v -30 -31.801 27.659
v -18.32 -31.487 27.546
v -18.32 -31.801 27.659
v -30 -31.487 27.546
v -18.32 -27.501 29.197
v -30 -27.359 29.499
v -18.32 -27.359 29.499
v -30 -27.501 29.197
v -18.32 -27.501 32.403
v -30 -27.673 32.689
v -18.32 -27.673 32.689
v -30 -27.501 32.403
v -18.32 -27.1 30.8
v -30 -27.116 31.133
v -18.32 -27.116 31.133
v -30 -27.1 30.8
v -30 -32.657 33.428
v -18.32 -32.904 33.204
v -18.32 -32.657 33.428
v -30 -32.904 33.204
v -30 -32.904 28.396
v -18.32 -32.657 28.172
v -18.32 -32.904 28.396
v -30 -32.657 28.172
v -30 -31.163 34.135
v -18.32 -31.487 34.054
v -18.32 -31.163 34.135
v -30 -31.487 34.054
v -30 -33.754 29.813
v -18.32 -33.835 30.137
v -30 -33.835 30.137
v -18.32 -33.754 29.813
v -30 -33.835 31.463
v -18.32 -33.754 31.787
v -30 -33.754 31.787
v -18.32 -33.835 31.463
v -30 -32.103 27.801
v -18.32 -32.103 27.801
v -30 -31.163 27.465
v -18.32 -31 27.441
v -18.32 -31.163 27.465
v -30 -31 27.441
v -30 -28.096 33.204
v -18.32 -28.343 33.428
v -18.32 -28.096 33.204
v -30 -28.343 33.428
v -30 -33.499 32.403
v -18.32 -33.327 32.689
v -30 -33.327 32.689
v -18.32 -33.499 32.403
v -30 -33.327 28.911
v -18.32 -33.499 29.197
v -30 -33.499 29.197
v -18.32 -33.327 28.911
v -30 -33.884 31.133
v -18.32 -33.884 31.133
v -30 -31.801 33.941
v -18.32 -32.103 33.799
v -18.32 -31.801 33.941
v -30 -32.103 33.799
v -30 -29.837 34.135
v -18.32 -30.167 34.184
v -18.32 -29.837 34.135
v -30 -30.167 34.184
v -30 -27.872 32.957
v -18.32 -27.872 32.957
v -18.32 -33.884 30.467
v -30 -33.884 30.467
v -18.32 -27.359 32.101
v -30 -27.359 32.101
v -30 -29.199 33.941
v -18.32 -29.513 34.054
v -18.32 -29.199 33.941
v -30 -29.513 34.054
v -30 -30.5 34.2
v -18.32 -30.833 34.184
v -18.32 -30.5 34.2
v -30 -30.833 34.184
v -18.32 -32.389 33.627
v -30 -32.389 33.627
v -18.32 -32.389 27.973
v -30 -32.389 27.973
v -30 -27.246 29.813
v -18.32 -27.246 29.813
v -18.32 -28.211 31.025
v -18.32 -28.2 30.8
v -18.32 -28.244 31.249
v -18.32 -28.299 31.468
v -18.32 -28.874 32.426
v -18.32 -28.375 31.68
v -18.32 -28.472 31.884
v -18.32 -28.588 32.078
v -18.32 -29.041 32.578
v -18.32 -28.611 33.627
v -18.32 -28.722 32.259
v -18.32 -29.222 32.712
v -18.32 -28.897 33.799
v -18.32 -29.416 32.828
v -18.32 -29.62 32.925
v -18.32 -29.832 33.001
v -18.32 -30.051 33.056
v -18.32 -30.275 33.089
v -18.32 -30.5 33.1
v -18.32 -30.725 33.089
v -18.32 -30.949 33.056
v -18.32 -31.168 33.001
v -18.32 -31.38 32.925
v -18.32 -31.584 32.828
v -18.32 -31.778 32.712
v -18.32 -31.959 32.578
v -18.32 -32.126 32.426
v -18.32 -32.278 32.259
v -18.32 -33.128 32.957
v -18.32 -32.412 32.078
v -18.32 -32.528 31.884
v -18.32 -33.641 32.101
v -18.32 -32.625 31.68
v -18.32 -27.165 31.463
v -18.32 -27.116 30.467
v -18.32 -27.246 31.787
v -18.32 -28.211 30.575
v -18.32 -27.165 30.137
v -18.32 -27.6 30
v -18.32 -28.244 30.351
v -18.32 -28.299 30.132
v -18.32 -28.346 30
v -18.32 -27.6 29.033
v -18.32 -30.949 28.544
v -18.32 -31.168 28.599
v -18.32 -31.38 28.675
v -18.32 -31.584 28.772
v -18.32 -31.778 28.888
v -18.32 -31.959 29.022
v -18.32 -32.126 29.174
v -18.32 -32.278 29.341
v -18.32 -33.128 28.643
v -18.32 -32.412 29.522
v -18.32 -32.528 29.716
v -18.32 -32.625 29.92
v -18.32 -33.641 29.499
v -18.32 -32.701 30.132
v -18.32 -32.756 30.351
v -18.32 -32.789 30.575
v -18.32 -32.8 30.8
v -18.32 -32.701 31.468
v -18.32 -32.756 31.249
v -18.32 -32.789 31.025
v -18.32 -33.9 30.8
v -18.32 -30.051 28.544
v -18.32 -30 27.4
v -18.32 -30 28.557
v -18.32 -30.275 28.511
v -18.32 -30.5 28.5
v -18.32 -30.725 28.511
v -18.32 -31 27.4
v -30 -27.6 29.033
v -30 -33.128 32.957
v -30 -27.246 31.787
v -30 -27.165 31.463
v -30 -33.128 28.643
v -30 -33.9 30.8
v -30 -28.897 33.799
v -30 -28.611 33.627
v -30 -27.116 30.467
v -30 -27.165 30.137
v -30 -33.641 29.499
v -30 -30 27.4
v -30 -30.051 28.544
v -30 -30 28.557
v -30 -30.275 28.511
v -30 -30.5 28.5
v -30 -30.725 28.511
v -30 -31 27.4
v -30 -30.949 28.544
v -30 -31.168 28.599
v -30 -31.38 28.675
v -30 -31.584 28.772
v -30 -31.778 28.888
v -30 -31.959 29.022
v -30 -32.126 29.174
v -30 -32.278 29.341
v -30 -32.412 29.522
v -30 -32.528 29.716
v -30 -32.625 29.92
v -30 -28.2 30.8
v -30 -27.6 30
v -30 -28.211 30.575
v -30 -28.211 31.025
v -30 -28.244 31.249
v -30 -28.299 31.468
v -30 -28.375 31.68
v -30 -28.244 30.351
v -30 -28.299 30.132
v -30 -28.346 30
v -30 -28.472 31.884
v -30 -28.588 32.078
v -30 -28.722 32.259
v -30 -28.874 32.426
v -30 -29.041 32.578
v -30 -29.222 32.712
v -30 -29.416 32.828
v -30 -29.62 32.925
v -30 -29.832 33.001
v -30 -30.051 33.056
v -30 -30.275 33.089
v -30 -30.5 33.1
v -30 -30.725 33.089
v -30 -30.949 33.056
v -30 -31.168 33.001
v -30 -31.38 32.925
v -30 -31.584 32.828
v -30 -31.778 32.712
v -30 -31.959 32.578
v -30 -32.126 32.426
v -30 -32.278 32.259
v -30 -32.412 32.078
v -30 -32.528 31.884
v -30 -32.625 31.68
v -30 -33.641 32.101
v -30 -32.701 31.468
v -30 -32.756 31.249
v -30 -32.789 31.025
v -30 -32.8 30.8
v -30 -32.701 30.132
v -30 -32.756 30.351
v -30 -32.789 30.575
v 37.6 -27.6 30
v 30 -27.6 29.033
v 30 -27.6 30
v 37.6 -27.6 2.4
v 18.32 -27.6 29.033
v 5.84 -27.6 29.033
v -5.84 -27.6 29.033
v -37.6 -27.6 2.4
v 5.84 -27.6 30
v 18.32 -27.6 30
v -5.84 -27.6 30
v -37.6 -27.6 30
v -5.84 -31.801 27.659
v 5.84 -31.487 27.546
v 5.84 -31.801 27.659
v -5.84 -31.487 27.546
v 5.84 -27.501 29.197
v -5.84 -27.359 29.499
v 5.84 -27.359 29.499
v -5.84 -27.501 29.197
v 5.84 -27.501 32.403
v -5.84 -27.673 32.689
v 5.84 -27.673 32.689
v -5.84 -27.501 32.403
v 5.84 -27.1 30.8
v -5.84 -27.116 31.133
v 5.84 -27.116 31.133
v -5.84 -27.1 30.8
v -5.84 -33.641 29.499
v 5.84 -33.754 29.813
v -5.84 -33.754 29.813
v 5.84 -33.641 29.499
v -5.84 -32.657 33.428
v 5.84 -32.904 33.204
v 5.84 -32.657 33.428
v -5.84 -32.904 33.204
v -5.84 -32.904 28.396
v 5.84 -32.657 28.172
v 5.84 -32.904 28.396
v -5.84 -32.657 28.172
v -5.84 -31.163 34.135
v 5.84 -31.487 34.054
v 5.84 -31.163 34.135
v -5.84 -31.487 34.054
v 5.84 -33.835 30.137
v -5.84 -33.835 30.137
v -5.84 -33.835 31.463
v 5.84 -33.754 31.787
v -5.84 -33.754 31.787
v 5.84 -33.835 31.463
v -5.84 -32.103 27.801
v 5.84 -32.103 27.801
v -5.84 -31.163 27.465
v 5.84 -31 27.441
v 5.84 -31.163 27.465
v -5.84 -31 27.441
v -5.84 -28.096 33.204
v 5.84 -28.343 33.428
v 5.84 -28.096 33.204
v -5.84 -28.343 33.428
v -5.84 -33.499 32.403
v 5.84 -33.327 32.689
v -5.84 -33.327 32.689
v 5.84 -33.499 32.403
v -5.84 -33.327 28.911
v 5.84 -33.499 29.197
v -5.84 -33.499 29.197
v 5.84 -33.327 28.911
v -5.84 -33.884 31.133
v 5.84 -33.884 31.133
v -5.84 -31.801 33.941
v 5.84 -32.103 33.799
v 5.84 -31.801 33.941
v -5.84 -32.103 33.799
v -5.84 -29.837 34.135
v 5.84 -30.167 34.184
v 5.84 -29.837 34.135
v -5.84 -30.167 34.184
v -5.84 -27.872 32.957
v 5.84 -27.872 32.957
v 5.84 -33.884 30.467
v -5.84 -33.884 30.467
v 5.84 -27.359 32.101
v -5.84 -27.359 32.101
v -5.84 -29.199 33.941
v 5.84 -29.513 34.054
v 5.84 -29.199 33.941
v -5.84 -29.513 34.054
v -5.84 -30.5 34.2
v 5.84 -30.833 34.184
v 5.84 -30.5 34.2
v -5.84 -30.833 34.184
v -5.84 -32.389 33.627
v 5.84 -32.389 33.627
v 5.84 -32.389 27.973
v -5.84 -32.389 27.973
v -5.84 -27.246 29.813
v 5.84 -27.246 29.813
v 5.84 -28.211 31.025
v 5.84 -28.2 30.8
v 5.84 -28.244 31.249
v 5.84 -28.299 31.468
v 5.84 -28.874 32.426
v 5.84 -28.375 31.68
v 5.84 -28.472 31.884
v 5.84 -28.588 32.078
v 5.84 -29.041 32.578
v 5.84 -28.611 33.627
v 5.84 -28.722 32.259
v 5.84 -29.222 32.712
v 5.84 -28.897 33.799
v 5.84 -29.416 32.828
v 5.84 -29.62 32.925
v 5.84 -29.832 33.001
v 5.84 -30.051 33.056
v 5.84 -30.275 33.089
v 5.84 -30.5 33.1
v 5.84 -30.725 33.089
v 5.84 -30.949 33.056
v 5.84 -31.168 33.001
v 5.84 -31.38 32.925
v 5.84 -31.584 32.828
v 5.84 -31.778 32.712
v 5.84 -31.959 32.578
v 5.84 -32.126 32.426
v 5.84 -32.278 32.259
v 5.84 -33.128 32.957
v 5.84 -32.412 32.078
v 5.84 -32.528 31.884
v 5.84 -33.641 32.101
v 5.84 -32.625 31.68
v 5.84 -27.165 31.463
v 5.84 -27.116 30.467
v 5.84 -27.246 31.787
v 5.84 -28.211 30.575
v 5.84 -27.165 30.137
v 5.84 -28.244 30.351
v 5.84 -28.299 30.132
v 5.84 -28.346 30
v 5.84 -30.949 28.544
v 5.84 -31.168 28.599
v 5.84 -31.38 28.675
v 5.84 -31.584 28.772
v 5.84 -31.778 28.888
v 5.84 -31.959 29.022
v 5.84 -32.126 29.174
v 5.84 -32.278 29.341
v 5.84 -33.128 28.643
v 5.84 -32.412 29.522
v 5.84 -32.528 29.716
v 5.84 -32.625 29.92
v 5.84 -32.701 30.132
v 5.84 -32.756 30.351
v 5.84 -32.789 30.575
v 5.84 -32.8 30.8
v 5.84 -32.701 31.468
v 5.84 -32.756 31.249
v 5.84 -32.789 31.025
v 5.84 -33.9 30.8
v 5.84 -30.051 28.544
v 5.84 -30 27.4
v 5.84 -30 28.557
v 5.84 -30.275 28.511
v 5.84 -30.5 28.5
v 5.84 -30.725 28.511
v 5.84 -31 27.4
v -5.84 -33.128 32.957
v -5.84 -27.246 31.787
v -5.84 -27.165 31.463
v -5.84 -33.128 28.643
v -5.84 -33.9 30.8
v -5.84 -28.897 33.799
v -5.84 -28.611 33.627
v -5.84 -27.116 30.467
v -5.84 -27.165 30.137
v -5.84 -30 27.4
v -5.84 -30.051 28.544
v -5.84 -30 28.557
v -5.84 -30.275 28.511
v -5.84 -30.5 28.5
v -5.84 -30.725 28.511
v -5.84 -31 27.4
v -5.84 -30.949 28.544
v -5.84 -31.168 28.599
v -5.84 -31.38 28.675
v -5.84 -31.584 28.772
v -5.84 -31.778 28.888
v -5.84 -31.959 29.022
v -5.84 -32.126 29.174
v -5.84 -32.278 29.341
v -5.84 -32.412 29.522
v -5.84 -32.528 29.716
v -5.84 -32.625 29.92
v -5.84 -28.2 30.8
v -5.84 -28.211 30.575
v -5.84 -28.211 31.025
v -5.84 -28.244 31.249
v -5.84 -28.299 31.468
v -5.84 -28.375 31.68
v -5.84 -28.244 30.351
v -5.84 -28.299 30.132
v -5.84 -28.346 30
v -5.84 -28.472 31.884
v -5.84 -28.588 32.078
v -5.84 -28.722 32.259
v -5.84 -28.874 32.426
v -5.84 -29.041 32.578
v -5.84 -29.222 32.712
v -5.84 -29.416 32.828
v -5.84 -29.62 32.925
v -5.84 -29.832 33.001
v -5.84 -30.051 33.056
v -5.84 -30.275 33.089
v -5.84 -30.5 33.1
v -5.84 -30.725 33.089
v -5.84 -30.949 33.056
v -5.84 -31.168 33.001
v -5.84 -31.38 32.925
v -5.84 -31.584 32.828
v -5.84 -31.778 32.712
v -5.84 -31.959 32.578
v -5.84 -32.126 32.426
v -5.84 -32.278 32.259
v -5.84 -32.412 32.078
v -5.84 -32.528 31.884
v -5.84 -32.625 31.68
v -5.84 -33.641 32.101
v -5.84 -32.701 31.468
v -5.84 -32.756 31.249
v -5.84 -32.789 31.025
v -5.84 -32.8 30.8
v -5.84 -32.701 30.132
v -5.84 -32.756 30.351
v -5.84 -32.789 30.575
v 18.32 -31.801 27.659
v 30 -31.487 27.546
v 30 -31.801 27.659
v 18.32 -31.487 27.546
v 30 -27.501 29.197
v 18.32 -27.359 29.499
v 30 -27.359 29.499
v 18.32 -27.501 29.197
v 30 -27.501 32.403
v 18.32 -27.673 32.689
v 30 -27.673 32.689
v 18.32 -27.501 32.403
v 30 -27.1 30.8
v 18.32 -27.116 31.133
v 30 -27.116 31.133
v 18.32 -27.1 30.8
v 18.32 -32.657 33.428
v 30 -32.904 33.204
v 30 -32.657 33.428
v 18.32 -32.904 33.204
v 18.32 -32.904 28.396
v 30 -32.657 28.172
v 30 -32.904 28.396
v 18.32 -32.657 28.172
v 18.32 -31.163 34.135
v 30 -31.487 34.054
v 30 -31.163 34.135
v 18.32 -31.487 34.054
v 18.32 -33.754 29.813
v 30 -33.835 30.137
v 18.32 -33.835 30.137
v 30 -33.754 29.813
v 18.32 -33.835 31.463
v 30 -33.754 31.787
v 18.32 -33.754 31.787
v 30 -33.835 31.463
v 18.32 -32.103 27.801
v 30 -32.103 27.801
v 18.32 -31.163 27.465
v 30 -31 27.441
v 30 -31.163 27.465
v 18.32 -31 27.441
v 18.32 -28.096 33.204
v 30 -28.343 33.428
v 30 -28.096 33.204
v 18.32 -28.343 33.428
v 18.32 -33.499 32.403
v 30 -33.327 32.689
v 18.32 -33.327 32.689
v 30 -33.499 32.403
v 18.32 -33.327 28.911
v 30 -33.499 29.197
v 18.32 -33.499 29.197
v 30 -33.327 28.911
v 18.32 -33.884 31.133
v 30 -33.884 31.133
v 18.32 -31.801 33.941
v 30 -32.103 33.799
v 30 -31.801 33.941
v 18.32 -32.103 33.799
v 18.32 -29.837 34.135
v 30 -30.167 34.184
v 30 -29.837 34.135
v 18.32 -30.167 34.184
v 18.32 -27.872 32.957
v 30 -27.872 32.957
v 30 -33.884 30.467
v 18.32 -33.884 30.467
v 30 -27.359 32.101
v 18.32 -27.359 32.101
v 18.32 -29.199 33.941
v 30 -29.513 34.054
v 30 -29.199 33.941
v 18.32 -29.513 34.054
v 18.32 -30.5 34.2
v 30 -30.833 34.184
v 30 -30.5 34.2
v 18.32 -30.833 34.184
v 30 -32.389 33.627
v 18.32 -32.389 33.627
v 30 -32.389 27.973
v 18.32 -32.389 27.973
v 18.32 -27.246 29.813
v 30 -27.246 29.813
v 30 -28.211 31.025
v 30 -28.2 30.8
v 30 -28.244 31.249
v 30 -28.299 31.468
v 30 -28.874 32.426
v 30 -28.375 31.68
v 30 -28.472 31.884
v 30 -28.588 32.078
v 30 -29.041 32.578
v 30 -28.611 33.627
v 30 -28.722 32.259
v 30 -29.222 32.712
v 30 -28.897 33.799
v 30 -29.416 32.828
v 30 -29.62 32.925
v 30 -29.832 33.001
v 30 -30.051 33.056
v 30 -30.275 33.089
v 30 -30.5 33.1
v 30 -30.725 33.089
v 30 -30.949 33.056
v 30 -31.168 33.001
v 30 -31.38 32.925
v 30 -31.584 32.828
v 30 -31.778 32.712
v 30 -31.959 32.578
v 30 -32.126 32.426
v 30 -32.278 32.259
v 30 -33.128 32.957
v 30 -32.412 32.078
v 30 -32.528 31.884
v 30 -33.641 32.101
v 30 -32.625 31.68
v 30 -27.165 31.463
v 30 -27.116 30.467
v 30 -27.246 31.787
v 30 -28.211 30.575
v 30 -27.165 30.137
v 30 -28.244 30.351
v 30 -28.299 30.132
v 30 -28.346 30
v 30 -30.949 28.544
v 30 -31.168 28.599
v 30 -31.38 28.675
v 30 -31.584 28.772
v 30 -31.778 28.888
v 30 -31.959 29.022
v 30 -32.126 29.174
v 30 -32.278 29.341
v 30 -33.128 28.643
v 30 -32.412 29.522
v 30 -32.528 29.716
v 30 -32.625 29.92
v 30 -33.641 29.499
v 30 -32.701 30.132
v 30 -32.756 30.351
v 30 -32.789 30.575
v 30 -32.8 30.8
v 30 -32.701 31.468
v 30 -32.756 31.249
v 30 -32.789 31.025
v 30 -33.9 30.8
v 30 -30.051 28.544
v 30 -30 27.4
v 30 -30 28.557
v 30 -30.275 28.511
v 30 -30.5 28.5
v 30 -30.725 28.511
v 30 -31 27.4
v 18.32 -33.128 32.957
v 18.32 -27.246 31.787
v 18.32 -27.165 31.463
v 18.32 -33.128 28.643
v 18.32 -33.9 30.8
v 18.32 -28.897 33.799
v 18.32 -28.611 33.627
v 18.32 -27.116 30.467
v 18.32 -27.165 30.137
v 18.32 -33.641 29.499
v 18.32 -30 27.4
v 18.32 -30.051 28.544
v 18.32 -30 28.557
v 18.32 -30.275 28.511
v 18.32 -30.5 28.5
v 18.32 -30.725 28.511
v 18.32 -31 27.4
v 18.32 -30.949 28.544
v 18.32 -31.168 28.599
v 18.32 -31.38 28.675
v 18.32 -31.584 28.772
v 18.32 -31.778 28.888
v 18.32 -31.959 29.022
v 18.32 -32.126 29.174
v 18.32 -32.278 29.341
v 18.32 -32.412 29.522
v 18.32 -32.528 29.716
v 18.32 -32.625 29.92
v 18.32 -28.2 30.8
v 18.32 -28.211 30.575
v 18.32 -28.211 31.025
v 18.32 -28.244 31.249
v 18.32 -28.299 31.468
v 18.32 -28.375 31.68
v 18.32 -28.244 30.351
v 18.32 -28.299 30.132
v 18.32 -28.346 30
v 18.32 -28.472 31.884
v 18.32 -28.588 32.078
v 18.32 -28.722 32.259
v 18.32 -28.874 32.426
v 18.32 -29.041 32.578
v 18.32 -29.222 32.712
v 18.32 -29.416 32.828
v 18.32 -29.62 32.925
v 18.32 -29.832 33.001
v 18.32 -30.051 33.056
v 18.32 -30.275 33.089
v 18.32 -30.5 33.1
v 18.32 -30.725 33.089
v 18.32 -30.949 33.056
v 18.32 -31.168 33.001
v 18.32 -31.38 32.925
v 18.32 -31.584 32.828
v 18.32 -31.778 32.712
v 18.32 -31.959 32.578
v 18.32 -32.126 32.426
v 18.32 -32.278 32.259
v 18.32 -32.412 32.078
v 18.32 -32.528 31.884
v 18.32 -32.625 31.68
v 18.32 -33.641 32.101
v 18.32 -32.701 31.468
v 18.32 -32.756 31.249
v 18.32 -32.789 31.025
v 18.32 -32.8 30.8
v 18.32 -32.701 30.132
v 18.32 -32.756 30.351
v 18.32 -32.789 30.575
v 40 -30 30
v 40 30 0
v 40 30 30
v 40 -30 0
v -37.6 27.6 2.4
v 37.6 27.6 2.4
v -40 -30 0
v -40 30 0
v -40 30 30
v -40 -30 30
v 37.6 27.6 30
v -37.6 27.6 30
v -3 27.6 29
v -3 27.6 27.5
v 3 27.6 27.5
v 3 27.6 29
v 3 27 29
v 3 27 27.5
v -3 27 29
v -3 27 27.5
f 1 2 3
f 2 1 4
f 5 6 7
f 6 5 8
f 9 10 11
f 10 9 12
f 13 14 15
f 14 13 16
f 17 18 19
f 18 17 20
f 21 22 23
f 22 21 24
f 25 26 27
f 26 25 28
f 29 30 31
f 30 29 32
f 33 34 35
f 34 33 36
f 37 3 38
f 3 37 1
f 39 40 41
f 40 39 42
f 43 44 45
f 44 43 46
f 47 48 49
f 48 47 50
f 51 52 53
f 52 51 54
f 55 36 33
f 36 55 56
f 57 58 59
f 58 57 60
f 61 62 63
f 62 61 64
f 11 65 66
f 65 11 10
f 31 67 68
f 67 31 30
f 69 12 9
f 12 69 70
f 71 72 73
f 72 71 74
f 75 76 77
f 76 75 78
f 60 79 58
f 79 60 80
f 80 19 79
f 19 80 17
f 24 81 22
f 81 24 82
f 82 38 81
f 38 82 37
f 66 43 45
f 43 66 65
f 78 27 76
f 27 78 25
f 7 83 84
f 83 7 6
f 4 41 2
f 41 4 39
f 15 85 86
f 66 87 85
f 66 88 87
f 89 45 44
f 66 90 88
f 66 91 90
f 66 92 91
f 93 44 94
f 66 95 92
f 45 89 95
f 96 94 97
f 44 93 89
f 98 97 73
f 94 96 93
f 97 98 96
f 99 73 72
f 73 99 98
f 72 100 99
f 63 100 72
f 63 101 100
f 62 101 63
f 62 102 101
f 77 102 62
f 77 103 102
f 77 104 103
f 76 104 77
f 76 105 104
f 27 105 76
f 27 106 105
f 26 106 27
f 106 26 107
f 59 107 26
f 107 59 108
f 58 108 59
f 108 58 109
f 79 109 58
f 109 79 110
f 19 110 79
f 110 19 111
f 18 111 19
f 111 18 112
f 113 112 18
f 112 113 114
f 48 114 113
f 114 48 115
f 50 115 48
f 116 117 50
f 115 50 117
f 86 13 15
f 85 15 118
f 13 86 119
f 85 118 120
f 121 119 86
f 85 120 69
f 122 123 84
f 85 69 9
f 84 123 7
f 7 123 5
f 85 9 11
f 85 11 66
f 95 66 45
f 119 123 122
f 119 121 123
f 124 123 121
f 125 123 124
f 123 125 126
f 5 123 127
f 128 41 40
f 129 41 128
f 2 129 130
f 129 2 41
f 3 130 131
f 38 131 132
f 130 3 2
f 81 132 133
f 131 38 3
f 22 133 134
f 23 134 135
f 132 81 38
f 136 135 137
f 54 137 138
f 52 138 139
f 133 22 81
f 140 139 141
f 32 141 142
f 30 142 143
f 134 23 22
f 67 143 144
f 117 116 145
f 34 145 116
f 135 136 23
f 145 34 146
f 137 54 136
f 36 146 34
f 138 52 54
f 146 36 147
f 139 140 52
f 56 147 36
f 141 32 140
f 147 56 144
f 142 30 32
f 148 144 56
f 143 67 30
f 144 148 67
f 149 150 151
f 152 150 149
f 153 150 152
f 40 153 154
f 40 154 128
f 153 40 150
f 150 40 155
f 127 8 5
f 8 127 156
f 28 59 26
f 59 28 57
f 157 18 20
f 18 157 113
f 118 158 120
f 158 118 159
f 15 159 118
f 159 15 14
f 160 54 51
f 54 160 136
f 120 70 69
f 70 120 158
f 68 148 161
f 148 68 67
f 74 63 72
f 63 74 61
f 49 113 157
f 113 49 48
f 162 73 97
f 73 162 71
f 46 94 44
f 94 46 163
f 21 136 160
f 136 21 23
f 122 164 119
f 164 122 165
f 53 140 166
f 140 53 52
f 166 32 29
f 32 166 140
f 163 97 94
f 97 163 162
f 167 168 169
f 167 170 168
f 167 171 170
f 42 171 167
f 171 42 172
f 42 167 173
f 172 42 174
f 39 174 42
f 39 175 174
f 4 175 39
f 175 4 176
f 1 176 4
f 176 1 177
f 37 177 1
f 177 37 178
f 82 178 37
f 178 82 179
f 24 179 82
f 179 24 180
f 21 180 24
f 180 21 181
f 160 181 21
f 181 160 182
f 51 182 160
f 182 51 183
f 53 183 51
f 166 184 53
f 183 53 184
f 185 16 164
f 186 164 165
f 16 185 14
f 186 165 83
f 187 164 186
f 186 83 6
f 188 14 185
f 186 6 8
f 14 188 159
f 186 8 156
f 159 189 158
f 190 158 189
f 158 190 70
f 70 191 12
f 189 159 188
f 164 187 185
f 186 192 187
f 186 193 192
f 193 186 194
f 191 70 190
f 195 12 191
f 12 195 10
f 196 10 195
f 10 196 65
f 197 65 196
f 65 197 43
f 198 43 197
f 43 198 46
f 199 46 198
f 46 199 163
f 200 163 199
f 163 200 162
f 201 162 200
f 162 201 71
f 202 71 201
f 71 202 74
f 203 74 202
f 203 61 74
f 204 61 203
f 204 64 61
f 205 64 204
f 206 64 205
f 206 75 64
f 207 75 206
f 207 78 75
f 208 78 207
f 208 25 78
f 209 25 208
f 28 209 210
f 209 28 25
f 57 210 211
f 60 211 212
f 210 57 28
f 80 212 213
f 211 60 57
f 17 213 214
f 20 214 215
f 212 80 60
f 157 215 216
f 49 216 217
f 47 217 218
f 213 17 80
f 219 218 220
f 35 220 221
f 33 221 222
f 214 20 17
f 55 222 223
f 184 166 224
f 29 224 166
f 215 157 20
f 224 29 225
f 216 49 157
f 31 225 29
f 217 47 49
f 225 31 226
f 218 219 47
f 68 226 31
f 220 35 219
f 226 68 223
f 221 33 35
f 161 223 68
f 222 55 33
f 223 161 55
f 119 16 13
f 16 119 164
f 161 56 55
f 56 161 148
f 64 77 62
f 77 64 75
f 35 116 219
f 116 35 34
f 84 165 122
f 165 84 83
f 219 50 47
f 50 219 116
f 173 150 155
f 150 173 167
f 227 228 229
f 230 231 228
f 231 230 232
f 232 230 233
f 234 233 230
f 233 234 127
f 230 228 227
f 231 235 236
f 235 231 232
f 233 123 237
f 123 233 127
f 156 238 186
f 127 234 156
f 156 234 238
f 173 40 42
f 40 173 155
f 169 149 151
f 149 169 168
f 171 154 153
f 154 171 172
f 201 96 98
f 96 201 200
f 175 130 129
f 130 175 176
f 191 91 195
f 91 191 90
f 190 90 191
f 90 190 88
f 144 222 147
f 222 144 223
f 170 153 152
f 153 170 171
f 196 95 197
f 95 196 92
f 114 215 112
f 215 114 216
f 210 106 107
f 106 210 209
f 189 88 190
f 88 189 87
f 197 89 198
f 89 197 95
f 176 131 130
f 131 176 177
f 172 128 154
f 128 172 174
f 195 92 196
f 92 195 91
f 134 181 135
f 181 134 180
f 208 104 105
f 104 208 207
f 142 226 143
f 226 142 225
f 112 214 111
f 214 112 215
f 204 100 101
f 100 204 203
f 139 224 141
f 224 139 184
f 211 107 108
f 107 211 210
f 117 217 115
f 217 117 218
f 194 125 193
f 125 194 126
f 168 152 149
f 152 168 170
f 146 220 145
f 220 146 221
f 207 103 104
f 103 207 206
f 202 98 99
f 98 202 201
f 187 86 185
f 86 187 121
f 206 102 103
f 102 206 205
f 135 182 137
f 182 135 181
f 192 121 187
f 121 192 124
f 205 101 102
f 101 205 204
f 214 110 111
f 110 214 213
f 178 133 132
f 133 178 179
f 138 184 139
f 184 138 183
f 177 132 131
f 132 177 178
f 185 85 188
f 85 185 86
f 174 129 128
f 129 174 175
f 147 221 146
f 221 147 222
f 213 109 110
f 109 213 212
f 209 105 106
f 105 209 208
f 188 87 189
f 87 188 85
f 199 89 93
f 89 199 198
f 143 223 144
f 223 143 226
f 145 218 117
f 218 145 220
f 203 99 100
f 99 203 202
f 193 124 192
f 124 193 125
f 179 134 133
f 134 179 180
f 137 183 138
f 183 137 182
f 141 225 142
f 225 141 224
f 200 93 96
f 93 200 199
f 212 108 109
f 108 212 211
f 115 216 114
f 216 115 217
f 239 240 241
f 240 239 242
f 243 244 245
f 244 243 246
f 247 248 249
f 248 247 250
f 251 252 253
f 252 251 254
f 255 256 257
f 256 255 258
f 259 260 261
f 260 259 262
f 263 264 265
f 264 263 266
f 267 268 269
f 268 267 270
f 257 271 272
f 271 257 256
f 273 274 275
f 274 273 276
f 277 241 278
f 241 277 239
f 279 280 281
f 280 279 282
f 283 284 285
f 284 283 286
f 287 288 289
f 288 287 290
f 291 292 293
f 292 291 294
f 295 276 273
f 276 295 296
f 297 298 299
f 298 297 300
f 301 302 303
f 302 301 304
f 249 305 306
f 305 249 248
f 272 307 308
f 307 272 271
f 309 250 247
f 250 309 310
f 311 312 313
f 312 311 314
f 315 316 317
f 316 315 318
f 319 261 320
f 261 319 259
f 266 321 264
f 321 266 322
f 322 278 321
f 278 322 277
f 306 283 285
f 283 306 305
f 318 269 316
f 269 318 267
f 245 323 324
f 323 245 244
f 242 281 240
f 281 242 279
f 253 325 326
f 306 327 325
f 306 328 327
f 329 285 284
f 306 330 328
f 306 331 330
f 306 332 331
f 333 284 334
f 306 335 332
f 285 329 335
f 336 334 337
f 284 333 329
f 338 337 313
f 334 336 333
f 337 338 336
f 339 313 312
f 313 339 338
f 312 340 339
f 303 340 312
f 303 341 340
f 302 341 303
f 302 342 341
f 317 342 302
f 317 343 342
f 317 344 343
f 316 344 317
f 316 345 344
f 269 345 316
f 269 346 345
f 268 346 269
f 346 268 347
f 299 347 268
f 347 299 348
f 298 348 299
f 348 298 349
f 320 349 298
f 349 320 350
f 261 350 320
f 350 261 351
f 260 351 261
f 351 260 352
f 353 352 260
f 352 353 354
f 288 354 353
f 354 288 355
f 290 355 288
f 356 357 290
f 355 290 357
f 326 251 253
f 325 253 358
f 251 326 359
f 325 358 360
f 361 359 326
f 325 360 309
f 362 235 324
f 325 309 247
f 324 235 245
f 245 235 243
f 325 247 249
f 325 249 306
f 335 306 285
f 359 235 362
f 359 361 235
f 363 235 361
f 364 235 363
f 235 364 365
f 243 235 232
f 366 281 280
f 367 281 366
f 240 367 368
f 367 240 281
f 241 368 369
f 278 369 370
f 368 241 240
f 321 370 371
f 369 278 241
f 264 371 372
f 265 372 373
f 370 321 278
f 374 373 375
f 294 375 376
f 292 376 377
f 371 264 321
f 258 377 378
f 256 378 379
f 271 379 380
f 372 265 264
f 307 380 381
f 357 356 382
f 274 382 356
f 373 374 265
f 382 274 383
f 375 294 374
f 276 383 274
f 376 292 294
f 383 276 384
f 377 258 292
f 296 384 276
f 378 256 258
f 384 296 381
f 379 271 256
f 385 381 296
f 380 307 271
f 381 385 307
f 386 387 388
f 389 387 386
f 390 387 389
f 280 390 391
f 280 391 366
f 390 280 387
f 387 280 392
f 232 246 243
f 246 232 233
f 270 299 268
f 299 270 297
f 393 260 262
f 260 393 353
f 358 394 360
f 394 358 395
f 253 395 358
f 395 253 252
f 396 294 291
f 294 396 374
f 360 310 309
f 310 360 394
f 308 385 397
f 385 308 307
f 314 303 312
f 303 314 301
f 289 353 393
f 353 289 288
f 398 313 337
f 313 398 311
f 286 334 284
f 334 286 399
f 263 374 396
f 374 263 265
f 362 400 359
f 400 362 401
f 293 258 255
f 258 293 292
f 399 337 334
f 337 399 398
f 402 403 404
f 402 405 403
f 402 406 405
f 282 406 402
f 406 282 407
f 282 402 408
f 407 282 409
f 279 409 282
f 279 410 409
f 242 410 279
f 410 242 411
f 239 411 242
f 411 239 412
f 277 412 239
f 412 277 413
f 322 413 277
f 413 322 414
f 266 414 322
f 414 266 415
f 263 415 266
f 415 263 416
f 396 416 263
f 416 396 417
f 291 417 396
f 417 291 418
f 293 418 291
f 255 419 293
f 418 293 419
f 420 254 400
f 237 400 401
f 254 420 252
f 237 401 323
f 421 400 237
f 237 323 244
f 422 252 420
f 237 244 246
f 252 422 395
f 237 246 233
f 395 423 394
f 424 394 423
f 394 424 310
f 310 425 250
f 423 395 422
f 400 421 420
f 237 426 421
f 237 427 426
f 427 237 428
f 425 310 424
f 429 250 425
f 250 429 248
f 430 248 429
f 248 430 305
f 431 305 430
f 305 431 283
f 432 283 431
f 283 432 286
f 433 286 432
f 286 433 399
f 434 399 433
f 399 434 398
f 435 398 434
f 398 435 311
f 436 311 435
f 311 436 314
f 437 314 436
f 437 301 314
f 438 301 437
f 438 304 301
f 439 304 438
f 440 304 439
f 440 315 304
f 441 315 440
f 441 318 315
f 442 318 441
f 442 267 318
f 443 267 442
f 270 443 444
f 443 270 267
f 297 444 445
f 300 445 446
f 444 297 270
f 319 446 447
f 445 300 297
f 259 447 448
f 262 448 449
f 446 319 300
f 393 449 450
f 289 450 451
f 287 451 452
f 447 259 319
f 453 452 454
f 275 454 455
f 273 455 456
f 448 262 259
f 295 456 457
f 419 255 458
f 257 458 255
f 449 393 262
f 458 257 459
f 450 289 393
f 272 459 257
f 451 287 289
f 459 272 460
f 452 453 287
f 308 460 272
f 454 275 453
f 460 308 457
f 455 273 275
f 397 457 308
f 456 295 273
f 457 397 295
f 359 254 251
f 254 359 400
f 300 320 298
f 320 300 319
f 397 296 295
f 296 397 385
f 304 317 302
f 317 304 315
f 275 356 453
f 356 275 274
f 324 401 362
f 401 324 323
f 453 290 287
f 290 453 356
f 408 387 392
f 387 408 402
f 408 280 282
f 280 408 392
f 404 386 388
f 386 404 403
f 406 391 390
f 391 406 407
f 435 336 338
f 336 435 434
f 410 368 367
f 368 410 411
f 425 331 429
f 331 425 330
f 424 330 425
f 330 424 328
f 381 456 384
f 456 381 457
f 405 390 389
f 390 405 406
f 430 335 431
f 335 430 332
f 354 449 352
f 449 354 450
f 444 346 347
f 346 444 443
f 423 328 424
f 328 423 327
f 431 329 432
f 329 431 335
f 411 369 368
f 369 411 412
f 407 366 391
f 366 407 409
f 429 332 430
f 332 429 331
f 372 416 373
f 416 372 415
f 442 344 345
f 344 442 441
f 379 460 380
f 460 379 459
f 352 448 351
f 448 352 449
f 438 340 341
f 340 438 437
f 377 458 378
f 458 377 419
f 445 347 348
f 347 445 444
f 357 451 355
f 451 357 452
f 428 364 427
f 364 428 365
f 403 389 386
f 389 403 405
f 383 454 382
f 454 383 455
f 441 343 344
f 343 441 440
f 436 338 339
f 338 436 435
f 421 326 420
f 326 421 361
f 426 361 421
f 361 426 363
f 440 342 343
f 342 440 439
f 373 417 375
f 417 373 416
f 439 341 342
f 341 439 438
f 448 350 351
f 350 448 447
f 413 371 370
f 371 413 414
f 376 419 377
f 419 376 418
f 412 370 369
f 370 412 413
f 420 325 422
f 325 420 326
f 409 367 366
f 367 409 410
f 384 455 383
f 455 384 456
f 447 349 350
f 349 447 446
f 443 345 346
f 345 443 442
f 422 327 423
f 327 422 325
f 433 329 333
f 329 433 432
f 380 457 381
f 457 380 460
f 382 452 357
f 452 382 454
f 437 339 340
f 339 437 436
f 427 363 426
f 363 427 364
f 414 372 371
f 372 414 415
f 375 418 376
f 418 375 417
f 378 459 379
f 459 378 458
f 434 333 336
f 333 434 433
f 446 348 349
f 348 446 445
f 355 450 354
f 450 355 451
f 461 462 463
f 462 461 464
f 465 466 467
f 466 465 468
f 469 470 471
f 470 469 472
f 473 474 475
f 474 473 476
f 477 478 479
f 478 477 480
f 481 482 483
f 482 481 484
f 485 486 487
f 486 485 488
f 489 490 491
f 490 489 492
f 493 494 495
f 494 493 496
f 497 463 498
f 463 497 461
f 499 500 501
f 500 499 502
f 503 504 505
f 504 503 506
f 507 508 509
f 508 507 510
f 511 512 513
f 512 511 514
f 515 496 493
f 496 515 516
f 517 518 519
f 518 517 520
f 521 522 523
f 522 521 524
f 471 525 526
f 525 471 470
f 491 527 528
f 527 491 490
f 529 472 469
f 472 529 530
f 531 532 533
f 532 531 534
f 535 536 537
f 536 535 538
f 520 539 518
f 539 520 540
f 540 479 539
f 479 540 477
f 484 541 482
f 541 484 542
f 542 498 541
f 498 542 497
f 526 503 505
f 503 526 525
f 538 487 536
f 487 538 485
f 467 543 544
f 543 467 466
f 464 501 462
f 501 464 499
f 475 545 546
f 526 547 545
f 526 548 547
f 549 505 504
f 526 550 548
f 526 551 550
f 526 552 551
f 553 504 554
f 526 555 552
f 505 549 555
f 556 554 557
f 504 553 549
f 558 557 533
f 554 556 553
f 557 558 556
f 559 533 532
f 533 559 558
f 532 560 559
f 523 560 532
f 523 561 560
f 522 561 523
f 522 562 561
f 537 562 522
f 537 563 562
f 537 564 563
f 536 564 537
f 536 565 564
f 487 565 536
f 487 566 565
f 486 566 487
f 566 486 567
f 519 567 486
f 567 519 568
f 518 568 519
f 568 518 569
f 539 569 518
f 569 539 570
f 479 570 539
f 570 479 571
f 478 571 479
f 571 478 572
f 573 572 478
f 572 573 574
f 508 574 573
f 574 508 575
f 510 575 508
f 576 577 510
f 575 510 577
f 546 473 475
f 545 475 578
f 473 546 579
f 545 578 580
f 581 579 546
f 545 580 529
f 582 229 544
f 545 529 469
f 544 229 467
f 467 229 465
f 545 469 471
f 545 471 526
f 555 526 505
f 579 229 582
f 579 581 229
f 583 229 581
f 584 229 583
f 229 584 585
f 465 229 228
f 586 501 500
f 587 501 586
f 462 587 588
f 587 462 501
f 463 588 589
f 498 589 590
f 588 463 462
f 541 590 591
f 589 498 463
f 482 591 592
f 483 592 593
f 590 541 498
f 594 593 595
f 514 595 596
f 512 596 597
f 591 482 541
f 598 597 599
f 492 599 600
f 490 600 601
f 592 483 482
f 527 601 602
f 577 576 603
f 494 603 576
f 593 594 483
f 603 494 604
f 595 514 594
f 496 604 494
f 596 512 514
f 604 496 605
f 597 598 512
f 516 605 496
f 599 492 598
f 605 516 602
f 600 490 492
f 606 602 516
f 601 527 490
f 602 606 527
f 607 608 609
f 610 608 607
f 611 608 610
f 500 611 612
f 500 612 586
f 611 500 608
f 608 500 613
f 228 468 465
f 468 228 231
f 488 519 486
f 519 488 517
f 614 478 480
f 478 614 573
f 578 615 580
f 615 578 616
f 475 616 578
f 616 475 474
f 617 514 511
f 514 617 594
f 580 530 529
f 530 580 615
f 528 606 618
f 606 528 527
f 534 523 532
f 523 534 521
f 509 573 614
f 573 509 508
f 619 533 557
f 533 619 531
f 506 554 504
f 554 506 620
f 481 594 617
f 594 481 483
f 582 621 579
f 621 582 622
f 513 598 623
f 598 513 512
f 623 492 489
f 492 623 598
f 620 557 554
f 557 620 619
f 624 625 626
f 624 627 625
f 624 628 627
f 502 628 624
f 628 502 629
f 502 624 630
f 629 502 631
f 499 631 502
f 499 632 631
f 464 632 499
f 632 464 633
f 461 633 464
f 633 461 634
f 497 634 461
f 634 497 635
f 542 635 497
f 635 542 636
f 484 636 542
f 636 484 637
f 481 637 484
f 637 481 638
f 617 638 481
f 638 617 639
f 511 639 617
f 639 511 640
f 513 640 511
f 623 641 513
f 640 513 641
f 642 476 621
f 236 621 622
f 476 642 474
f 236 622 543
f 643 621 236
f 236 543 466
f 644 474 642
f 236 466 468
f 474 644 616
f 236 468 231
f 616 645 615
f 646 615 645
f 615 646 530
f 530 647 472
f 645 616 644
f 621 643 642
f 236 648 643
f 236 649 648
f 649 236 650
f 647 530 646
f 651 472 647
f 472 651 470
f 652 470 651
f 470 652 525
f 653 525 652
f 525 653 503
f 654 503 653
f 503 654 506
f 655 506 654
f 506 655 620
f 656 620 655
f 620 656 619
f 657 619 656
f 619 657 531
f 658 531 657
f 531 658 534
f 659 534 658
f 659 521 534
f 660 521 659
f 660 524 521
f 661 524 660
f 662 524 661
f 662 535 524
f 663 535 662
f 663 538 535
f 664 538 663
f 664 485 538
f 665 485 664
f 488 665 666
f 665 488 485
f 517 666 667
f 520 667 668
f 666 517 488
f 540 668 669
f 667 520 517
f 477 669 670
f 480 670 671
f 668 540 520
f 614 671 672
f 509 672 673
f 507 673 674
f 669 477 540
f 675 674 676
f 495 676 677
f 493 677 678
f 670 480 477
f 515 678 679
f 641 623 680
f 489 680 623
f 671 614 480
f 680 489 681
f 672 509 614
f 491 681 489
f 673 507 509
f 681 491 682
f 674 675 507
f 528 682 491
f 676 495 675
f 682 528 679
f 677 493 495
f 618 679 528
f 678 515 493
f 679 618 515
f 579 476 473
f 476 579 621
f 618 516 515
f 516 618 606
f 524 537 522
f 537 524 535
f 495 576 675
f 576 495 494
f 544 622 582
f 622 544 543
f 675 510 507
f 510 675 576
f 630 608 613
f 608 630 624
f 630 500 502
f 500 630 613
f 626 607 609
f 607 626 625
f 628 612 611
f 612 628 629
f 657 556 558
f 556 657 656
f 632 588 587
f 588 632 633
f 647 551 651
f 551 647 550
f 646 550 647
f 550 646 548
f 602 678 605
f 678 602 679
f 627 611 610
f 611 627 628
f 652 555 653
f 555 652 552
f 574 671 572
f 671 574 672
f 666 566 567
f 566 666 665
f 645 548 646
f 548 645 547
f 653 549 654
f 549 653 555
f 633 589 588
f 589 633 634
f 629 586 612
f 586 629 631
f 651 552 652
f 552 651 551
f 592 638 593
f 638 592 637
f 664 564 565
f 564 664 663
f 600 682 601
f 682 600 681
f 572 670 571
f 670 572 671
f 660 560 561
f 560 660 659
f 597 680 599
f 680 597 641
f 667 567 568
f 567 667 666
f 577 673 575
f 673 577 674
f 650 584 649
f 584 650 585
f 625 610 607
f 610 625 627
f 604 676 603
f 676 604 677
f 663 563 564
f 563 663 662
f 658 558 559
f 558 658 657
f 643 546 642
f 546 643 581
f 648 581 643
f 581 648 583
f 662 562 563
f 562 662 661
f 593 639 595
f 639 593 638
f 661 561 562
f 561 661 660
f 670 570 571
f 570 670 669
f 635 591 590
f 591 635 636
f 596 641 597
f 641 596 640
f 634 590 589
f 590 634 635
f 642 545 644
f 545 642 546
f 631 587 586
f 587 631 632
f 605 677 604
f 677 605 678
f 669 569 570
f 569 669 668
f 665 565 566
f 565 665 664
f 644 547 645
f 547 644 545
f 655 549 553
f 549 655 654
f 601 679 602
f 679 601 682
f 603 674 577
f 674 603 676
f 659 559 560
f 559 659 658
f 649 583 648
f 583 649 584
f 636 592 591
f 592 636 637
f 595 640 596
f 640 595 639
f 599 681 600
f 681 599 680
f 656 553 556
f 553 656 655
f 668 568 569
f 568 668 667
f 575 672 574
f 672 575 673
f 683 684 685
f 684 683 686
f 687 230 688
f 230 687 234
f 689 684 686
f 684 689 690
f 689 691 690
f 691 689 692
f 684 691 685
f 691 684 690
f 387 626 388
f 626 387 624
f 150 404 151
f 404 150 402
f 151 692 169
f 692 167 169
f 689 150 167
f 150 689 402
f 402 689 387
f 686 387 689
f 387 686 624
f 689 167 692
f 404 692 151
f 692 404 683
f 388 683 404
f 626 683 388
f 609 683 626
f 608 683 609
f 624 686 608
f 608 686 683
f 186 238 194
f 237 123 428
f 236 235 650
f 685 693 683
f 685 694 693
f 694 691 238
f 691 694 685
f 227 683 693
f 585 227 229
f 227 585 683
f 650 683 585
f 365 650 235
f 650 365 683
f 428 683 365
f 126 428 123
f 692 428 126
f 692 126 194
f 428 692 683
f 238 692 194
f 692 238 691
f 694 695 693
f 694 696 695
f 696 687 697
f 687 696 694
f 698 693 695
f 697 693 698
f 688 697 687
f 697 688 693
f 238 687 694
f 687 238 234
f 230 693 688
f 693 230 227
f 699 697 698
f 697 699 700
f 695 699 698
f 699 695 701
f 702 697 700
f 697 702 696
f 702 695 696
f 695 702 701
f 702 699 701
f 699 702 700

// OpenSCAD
// Box with print-in-place hinge
// [box, lid, pin, assembly]
part = "box";
cadverify_only = "";
module instance(name, part, unit = 1) {
    echo(cadverify_instance = [name, part, unit]);
    if (cadverify_only == "" || cadverify_only == name) children();
}

// Parameters (mm)
W = 80; D = 60; Hbox = 30; Hlid = 10;
t_wall = 2.4; t_floor = 2.4; t_top = 2.4;
Rkn = 3.4; rbore = 2.3; rpin = 2.0;
yh = -30.5;
zh_box = 30.8;            // hinge axis Z (box coords = assembly)
lid_zh = 3.4;             // hinge axis Z in lid part coords
lid_lift = 27.4;          // lid part -> assembly
pin_lift_z = 27.8; pin_shift_y = -30.5;
k0x0=-30; k0x1=-18.32;
k1x0=-17.92; k1x1=-6.24;
k2x0=-5.84; k2x1=5.84;
k3x0=6.24; k3x1=17.92;
k4x0=18.32; k4x1=30;

$fn = 64;

module knuckle_solid(x0,x1,yh,zh) {
    translate([x0,yh,zh]) rotate([0,90,0]) cylinder(r=Rkn, h=x1-x0);
}
module knuckle_bore(x0,x1,yh,zh) {
    translate([x0-0.06,yh,zh]) rotate([0,90,0]) cylinder(r=rbore, h=(x1-x0)+0.12);
}
module box_knuckle(x0,x1) {
    difference() {
        union() {
            knuckle_solid(x0,x1,yh,zh_box);
            translate([x0,-31,27.4]) cube([x1-x0, 3.4, 3.4]);
        }
        knuckle_bore(x0,x1,yh,zh_box);
    }
}
module lid_knuckle(x0,x1) {
    difference() {
        union() {
            knuckle_solid(x0,x1,yh,lid_zh);
            translate([x0,-31,0]) cube([x1-x0, 3.4, 5.0]);
        }
        knuckle_bore(x0,x1,yh,lid_zh);
    }
}
module box_part() {
    union() {
        translate([-40,-30,0]) cube([80,60,t_floor]);
        translate([-40,27.6,t_floor]) cube([80,2.4,Hbox-t_floor]);
        translate([-40,-30,t_floor]) cube([80,2.4,Hbox-t_floor]);
        translate([-40,-27.6,t_floor]) cube([2.4,55.2,Hbox-t_floor]);
        translate([37.6,-27.6,t_floor]) cube([2.4,55.2,Hbox-t_floor]);
        translate([-3,27.0,27.5]) cube([6,0.6,1.5]);
        box_knuckle(k0x0,k0x1);
        box_knuckle(k2x0,k2x1);
        box_knuckle(k4x0,k4x1);
    }
}
module lid_part() {
    difference() {
        union() {
            translate([-40,-30,10.6]) cube([80,60,2.4]);
            translate([-40,27.6,3]) cube([80,2.4,7.6]);
            translate([-40,-30,3]) cube([80,2.4,7.6]);
            translate([-40,-27.6,3]) cube([2.4,55.2,7.6]);
            translate([37.6,-27.6,3]) cube([2.4,55.2,7.6]);
            translate([-37.2,25.2,0]) cube([74.4,2.0,10.6]);
            translate([-37.2,-27.2,0]) cube([74.4,2.0,10.6]);
            translate([-37.2,-25.2,0]) cube([2.0,50.4,10.6]);
            translate([35.2,-25.2,0]) cube([2.0,50.4,10.6]);
            lid_knuckle(k1x0,k1x1);
            lid_knuckle(k3x0,k3x1);
        }
        translate([-3.2,26.4,-0.05]) cube([6.4,0.85,1.85]);
    }
}
module pin_part() {
    union() {
        translate([-32.4,0,3]) rotate([0,90,0]) cylinder(r=rpin, h=64.8);
        translate([30.4,0,3]) rotate([0,90,0]) cylinder(r=3, h=2);
        translate([-32.4,0,3]) rotate([0,90,0]) cylinder(r=3, h=2);
    }
}

if (part=="box") {
    echo(cadverify_spec = [
        ["bounds", [[-40,-33.9,0],[40,30,34.2]]],
        ["bodies", 1],
        ["through_holes", 3],
        ["support_faces", [["bed","-z",4000]]],
        ["overhangs_allowed", [["hinge knuckle and bore undersides print in place", [[-30,-34.5,26],[30,-26.5,31.5]]]]],
        ["copies", 1],
        ["details", [
            ["floor","thickness",[0,0,-1],[0,0,1],2.4],
            ["front_wall","thickness",[0,31,15],[0,-1,0],2.4],
            ["cavity","void",[[-37.6,-27.6,2.4],[37.6,27.6,29.9]],0.9],
            ["hinge_bore","hole",[-31,-30.5,30.8],[1,0,0],[[0,4.6],[11.6,4.6]]],
            ["catch_bump","material",[[-3,27.0,27.5],[3,27.6,29.0]],0.9],
            ["hinge_view","view",[[-30,-34.5,26],[30,-26.5,35]]]
        ]]
    ]);
    box_part();
} else if (part=="lid") {
    echo(cadverify_spec = [
        ["bounds", [[-40,-33.9,0],[40,30,13]]],
        ["bodies", 1],
        ["through_holes", 2],
        ["support_faces", [["bed","-z",300]]],
        ["overhangs_allowed", [
            ["hinge knuckle and bore undersides print in place", [[-18,-34.5,0],[18,-26.5,4]]],
            ["lid top bridging over plug cavity", [[-37.2,-25.2,9],[37.2,25.2,11]]]
        ]],
        ["copies", 1],
        ["details", [
            ["top","thickness",[0,0,14],[0,0,-1],2.4],
            ["skirt","thickness",[0,31,6],[0,-1,0],2.4],
            ["plug_cavity","void",[[-35.2,-25.2,0],[35.2,25.2,10.5]],0.9],
            ["hinge_bore","hole",[-18.6,-30.5,3.4],[1,0,0],[[0,4.6],[11.6,4.6]]],
            ["catch_notch","void",[[-3.2,26.4,0],[3.2,27.25,1.8]],0.9],
            ["catch_view","view",[[-5,25,0],[5,28.5,3]]]
        ]]
    ]);
    lid_part();
} else if (part=="pin") {
    echo(cadverify_spec = [
        ["bounds", [[-32.4,-3,0],[32.4,3,6]]],
        ["bodies", 1],
        ["support_faces", []],
        ["overhangs_allowed", [["pin shaft underside bridges inside bore with 0.3 gap", [[-32.4,-3,0],[32.4,3,2.5]]]]],
        ["copies", 1],
        ["details", [
            ["shaft","thickness",[0,3,3],[0,-1,0],4.0],
            ["head","material",[[30.4,-3,0],[32.4,3,6]],0.7],
            ["pin_view","view",[[-32.4,-3,0],[32.4,3,6]]]
        ]]
    ]);
    pin_part();
} else if (part=="assembly") {
    echo(cadverify_spec = [
        ["bounds", [[-40,-33.9,0],[40,30,40.4]]],
        ["support_faces", [["bed","-z",4000]]],
        ["allowed_interferences", []],
        ["motions", [
            ["lid_open", ["lid"], "rotate", [0,-30.5,30.8], [1,0,0], [0,110], ["flex", [["lid","box",0.8,"snap catch bump passes over plug"]]]]
        ]],
        ["assembly_order", [
            [["box"], [0,0,0]],
            [["lid"], [0,0,-1]],
            [["pin"], [1,0,0]]
        ]],
        ["print_in_place", 0.3],
        ["overhangs_allowed", [
            ["hinge undersides and pin bridge in place", [[-33,-34.5,26],[33,-26.5,35]]],
            ["lid top bridging over box cavity", [[-37.6,-27.6,29.5],[37.6,27.6,38.5]]]
        ]]
    ]);
    instance("box","box") box_part();
    instance("lid","lid") translate([0,0,lid_lift]) lid_part();
    instance("pin","pin") translate([0,pin_shift_y,pin_lift_z]) pin_part();
}
